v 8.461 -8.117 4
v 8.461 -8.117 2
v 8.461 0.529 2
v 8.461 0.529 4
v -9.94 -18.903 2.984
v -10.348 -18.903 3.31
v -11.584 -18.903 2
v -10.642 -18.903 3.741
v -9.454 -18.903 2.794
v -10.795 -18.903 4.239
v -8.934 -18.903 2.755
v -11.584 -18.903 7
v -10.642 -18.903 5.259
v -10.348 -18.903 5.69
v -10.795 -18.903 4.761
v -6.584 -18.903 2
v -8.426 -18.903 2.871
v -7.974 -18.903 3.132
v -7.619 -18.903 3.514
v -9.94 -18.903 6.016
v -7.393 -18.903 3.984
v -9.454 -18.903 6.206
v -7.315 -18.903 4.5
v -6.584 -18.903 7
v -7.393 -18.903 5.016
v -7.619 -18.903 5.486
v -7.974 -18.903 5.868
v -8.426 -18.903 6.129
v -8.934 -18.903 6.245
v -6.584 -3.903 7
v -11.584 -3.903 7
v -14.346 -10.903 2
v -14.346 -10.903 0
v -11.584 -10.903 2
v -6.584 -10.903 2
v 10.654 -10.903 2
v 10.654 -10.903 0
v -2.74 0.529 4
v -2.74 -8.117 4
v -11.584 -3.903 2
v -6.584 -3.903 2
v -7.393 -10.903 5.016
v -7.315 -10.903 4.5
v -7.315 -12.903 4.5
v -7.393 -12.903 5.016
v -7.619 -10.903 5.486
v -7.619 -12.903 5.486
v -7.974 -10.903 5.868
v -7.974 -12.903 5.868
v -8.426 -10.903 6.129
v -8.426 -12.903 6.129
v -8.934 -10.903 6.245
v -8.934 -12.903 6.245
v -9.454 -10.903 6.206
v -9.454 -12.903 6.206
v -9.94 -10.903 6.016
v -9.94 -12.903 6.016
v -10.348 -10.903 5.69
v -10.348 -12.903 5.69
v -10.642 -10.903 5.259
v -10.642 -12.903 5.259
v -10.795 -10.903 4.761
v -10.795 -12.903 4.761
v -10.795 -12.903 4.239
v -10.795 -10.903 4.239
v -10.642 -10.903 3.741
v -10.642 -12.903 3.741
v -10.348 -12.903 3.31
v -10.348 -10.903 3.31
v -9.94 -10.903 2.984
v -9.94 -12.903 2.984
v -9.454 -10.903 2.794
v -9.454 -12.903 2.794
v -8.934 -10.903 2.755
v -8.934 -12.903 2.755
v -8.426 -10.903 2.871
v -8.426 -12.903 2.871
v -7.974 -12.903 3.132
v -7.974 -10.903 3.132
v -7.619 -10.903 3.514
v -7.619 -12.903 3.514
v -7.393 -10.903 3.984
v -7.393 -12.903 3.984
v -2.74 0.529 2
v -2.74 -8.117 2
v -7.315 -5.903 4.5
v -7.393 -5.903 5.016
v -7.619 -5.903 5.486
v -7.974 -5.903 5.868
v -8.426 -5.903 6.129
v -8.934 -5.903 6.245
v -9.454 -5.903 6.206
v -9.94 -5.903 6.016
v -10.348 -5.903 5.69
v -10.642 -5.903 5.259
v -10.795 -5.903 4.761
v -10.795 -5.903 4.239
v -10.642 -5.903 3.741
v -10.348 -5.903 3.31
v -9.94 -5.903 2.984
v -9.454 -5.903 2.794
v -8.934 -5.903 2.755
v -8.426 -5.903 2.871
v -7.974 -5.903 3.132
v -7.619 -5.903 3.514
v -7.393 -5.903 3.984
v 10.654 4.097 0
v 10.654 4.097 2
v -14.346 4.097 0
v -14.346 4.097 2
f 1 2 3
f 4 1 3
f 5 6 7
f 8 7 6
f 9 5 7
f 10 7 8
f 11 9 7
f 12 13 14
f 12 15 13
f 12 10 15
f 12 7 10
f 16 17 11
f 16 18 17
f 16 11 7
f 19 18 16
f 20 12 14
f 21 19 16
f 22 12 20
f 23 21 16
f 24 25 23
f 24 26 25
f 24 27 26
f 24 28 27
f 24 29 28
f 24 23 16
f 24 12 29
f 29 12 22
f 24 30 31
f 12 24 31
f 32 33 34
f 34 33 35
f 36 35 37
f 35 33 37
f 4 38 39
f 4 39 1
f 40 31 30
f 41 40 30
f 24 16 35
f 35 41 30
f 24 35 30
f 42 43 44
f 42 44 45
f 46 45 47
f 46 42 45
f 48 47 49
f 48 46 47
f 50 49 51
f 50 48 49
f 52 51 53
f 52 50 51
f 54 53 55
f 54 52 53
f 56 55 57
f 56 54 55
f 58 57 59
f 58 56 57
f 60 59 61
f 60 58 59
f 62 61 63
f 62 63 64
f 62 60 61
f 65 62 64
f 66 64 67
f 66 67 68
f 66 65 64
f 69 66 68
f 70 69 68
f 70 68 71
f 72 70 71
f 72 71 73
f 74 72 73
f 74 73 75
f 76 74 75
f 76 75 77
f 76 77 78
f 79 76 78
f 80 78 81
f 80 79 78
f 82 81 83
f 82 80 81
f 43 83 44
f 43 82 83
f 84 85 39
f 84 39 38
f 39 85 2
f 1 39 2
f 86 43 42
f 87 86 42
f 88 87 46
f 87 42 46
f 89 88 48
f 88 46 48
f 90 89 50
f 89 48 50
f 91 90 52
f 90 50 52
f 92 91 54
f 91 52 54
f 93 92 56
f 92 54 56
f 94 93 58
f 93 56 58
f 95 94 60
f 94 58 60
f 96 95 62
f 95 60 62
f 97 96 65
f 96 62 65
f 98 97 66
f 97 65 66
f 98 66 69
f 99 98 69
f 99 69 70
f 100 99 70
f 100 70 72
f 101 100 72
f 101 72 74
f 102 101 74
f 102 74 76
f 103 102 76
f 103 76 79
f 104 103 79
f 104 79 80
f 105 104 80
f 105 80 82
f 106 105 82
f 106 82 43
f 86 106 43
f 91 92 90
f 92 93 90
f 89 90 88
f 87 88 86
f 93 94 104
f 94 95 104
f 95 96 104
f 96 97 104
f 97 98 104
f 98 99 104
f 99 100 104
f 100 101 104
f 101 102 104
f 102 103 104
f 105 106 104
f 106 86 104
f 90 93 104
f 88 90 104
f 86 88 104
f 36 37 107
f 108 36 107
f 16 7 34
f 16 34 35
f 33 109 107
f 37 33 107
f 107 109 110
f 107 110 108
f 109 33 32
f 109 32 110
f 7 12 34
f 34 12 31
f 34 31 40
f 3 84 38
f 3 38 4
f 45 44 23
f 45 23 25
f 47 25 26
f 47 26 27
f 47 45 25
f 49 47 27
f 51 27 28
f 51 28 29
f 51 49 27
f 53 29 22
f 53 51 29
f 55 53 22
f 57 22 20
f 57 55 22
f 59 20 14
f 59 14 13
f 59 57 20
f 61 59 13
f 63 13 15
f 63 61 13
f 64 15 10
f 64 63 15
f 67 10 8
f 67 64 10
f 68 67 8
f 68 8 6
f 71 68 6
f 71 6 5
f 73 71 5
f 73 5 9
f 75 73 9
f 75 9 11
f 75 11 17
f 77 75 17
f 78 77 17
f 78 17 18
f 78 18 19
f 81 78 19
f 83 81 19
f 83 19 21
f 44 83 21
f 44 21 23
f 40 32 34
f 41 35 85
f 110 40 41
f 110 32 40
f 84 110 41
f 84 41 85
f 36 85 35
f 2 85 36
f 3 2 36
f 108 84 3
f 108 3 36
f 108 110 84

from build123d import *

# Parameters (mm, degrees)
SKETCH_2_W      = 25
SKETCH_2_H      = 15
EXTRUDE_1_DEPTH = 2
SKETCH_4_R      = 1.75
EXTRUDE_2_DEPTH = 7
SKETCH_5_W      = 5
SKETCH_5_H      = 5
EXTRUDE_3_DEPTH = 2
EXTRUDE_START   = 2
SKETCH_4_3_R    = 1.75
EXTRUDE_4_DEPTH = 2
SKETCH_7_W      = 11.201035141
SKETCH_7_H      = 8.645905099
EXTRUDE_5_DEPTH = 2
EXTRUDE_START_2 = 8
SKETCH_4_4_R    = 1.75
EXTRUDE_6_DEPTH = 8


with BuildPart() as part:
    # 草图2 → 凸台-拉伸1 (new body)
    with BuildSketch(Plane.XY):
        with Locations((-1.845610675, -3.40346801)):
            Rectangle(SKETCH_2_W, SKETCH_2_H)
    extrude(amount=EXTRUDE_1_DEPTH)

    # 草图4 → 凸台-拉伸2 (add)
    with BuildSketch(Plane.XZ.offset(10.90346801)):
        Polygon((-11.584222065, 7), (-11.584222065, 2), (-11.507000867, 2), (-6.584222065, 2), (-6.584222065, 7), align=None)
        with Locations((-9.064916765, 4.5)):
            Circle(SKETCH_4_R, mode=Mode.SUBTRACT)
    extrude(amount=-EXTRUDE_2_DEPTH)

    # 草图5 → 凸台-拉伸3 (add)
    with BuildSketch(Plane(origin=(0, -3.90346801, 0), x_dir=(1, 0, 0), z_dir=(0, 1, 0))):
        with Locations((-9.084222065, -4.5)):
            Rectangle(SKETCH_5_W, SKETCH_5_H)
    extrude(amount=-EXTRUDE_3_DEPTH)

    # 草图4<3> → 凸台-拉伸4 (add)
    with BuildSketch(Plane.XZ.offset(10.90346801).offset(EXTRUDE_START)):
        Polygon((-11.584222065, 7), (-11.584222065, 2), (-11.507000867, 2), (-6.584222065, 2), (-6.584222065, 7), align=None)
        with Locations((-9.064916765, 4.5)):
            Circle(SKETCH_4_3_R, mode=Mode.SUBTRACT)
    extrude(amount=-EXTRUDE_4_DEPTH)

    # 草图7 → 凸台-拉伸5 (add)
    with BuildSketch(Plane.XY.offset(2)):
        with Locations((2.86075116, -3.79430768)):
            Rectangle(SKETCH_7_W, SKETCH_7_H)
    extrude(amount=EXTRUDE_5_DEPTH)

    # 草图4<4> → 凸台-拉伸6 (add)
    with BuildSketch(Plane.XZ.offset(10.90346801).offset(EXTRUDE_START_2)):
        Polygon((-11.584222065, 7), (-11.584222065, 2), (-11.507000867, 2), (-6.584222065, 2), (-6.584222065, 7), align=None)
        with Locations((-9.064916765, 4.5)):
            Circle(SKETCH_4_4_R, mode=Mode.SUBTRACT)
    extrude(amount=-EXTRUDE_6_DEPTH)


solid = part.part
